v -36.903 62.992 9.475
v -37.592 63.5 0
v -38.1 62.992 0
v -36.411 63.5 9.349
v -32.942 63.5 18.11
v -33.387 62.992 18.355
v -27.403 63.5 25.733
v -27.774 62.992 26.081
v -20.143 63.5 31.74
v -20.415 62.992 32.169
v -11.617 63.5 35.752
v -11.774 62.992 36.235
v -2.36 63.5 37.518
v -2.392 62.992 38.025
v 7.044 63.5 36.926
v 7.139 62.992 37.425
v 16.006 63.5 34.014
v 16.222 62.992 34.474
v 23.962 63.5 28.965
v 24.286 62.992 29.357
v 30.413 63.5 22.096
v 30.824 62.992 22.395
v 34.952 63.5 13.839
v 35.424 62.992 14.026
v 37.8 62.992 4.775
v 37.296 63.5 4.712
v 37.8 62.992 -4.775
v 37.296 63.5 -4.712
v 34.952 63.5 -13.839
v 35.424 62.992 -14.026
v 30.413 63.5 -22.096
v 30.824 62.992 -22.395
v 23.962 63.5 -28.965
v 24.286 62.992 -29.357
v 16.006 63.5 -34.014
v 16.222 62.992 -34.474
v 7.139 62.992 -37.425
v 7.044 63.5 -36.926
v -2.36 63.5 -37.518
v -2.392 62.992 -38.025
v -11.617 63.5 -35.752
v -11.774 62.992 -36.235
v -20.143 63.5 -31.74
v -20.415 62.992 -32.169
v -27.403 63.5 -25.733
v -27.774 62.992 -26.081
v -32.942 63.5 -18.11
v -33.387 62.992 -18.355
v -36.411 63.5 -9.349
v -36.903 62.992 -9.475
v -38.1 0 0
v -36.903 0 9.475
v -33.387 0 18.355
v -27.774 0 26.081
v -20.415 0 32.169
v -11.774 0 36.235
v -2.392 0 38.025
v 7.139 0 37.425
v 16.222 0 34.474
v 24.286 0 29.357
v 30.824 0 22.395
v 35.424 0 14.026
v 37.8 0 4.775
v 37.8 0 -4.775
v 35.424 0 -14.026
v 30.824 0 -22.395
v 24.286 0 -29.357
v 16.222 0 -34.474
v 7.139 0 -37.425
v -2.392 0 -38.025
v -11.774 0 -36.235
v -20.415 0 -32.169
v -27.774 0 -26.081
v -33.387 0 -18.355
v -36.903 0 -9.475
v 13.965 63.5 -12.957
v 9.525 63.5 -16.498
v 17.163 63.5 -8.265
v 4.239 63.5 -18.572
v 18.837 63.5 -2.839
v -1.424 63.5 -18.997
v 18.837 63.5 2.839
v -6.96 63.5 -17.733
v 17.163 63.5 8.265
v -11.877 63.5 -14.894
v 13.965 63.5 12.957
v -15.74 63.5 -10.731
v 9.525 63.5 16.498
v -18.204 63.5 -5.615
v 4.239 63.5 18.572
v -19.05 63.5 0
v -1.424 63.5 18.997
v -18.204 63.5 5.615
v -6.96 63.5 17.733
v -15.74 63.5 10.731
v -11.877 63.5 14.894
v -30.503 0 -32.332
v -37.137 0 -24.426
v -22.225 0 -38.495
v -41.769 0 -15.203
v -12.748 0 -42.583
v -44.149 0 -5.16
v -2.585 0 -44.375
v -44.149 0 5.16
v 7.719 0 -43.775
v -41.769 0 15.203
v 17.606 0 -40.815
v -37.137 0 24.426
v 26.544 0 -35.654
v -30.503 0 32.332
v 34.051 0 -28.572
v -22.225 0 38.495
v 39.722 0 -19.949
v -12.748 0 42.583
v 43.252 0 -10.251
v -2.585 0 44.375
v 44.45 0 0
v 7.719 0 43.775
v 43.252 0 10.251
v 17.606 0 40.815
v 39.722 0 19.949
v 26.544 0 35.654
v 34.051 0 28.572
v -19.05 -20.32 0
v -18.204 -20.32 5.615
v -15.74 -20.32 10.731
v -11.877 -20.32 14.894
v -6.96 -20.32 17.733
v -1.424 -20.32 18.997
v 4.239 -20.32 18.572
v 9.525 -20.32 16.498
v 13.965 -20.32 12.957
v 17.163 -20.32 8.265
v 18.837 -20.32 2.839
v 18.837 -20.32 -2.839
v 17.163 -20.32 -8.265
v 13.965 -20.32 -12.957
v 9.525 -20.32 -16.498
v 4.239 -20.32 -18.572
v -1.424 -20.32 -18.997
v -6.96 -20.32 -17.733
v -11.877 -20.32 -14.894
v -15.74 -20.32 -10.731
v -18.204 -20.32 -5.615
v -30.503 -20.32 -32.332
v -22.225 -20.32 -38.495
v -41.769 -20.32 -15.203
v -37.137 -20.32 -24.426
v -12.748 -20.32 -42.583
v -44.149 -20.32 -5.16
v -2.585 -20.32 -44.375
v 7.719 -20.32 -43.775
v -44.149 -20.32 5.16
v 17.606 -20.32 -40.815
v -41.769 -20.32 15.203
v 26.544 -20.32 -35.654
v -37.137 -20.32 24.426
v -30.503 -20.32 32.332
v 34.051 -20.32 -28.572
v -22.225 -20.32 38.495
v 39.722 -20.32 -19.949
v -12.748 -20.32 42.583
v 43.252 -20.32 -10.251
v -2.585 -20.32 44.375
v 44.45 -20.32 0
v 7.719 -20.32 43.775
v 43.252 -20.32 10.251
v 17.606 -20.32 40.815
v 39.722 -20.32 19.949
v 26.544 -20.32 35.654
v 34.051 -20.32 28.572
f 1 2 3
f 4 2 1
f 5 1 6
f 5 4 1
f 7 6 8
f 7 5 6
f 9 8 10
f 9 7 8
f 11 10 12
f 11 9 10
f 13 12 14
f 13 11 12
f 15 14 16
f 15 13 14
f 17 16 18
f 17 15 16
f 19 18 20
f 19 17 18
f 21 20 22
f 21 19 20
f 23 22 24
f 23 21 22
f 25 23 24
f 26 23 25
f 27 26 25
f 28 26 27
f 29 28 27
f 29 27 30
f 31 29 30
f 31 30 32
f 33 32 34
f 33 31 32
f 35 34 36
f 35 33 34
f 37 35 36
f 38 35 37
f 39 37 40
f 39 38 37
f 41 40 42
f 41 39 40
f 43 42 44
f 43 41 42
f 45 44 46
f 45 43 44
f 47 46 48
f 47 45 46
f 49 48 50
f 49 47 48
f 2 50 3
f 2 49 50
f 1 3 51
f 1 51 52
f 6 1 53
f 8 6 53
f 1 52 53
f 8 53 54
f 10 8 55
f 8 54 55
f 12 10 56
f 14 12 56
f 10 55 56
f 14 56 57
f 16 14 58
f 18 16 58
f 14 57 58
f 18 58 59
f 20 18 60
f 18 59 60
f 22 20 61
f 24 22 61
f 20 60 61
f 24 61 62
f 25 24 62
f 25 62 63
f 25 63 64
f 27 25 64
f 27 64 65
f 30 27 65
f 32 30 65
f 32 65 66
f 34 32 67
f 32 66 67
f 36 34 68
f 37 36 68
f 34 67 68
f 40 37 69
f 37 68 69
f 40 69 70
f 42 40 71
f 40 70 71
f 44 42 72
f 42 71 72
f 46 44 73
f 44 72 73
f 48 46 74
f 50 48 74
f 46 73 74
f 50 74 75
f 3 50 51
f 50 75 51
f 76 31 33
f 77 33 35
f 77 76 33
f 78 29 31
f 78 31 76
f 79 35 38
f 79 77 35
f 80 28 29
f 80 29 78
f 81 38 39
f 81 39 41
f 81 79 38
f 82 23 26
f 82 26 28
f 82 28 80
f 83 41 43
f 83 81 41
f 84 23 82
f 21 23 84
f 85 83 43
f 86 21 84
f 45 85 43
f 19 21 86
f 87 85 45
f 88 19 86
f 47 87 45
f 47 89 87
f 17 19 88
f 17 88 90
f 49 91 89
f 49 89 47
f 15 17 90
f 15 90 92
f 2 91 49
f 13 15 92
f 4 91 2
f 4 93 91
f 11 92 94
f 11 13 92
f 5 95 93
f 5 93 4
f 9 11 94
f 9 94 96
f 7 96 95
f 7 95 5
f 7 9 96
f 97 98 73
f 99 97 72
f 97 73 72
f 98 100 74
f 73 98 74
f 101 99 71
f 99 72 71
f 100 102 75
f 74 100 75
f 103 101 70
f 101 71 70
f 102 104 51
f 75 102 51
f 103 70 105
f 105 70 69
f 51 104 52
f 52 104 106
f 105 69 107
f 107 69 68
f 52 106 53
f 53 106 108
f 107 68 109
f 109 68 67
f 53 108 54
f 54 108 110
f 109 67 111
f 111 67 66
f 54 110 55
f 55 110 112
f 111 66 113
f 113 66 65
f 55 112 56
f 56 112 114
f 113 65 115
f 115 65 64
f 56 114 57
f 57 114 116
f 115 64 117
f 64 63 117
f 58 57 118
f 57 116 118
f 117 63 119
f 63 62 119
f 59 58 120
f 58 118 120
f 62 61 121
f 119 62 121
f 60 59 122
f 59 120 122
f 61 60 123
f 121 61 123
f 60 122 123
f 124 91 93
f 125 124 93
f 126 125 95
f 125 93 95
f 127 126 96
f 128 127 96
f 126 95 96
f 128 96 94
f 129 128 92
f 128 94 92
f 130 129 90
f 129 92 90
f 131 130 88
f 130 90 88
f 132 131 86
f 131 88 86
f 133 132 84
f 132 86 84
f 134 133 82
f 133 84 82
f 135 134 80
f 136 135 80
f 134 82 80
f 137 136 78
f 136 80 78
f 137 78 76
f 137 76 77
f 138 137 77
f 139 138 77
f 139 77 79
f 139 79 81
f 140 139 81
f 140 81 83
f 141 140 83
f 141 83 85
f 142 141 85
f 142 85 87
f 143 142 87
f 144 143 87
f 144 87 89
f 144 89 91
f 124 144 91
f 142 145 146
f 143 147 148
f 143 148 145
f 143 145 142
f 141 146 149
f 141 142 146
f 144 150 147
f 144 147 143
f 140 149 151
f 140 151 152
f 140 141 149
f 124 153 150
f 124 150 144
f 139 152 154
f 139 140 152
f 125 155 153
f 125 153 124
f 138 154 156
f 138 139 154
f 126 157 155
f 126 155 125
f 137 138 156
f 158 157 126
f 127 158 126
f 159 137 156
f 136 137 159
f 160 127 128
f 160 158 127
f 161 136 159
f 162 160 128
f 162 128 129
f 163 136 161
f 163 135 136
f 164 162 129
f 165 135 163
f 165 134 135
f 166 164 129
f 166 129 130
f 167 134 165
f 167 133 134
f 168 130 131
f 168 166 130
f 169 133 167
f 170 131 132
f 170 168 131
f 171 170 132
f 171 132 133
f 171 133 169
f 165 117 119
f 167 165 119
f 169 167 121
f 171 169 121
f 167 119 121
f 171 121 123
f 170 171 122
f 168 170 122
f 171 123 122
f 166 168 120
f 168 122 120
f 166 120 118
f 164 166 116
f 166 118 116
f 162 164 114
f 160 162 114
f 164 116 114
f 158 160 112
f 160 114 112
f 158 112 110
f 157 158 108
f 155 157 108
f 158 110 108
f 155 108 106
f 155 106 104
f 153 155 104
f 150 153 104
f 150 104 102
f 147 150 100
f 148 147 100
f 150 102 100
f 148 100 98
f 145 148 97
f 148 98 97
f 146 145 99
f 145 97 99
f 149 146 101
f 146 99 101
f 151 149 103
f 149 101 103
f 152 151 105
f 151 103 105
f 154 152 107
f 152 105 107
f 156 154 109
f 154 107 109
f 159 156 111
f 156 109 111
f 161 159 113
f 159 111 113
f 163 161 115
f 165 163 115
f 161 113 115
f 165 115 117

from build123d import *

# Parameters (mm, degrees)
F0_R     = 44.45
F1_DEPTH = 20.32
F2_R     = 38.1
F3_DEPTH = 63.5
F4_SIZE  = 0.508
F6_D     = 38.1


with BuildPart() as f1:
    # F0 (on Front) → F1 (new body)
    with BuildSketch(Plane.XZ):
        Circle(F0_R)
    extrude(amount=F1_DEPTH)

    # F2 (on face) → F3 (join)
    with BuildSketch(Plane(origin=(0, 0, 0), x_dir=(-1, 0, 0), z_dir=(0, 1, 0))):
        Circle(F2_R)
    extrude(amount=F3_DEPTH)

    # F4
    f4_edges = [f1.edges().sort_by_distance(p)[0] for p in [
        (38.1, 63.5, 0),
    ]]
    chamfer(f4_edges, length=F4_SIZE)

    # F6 (through all)
    with Locations(Plane.XZ.offset(20.32)):
        with Locations((0, 0)):
            Hole(F6_D / 2)


solid = f1.part
